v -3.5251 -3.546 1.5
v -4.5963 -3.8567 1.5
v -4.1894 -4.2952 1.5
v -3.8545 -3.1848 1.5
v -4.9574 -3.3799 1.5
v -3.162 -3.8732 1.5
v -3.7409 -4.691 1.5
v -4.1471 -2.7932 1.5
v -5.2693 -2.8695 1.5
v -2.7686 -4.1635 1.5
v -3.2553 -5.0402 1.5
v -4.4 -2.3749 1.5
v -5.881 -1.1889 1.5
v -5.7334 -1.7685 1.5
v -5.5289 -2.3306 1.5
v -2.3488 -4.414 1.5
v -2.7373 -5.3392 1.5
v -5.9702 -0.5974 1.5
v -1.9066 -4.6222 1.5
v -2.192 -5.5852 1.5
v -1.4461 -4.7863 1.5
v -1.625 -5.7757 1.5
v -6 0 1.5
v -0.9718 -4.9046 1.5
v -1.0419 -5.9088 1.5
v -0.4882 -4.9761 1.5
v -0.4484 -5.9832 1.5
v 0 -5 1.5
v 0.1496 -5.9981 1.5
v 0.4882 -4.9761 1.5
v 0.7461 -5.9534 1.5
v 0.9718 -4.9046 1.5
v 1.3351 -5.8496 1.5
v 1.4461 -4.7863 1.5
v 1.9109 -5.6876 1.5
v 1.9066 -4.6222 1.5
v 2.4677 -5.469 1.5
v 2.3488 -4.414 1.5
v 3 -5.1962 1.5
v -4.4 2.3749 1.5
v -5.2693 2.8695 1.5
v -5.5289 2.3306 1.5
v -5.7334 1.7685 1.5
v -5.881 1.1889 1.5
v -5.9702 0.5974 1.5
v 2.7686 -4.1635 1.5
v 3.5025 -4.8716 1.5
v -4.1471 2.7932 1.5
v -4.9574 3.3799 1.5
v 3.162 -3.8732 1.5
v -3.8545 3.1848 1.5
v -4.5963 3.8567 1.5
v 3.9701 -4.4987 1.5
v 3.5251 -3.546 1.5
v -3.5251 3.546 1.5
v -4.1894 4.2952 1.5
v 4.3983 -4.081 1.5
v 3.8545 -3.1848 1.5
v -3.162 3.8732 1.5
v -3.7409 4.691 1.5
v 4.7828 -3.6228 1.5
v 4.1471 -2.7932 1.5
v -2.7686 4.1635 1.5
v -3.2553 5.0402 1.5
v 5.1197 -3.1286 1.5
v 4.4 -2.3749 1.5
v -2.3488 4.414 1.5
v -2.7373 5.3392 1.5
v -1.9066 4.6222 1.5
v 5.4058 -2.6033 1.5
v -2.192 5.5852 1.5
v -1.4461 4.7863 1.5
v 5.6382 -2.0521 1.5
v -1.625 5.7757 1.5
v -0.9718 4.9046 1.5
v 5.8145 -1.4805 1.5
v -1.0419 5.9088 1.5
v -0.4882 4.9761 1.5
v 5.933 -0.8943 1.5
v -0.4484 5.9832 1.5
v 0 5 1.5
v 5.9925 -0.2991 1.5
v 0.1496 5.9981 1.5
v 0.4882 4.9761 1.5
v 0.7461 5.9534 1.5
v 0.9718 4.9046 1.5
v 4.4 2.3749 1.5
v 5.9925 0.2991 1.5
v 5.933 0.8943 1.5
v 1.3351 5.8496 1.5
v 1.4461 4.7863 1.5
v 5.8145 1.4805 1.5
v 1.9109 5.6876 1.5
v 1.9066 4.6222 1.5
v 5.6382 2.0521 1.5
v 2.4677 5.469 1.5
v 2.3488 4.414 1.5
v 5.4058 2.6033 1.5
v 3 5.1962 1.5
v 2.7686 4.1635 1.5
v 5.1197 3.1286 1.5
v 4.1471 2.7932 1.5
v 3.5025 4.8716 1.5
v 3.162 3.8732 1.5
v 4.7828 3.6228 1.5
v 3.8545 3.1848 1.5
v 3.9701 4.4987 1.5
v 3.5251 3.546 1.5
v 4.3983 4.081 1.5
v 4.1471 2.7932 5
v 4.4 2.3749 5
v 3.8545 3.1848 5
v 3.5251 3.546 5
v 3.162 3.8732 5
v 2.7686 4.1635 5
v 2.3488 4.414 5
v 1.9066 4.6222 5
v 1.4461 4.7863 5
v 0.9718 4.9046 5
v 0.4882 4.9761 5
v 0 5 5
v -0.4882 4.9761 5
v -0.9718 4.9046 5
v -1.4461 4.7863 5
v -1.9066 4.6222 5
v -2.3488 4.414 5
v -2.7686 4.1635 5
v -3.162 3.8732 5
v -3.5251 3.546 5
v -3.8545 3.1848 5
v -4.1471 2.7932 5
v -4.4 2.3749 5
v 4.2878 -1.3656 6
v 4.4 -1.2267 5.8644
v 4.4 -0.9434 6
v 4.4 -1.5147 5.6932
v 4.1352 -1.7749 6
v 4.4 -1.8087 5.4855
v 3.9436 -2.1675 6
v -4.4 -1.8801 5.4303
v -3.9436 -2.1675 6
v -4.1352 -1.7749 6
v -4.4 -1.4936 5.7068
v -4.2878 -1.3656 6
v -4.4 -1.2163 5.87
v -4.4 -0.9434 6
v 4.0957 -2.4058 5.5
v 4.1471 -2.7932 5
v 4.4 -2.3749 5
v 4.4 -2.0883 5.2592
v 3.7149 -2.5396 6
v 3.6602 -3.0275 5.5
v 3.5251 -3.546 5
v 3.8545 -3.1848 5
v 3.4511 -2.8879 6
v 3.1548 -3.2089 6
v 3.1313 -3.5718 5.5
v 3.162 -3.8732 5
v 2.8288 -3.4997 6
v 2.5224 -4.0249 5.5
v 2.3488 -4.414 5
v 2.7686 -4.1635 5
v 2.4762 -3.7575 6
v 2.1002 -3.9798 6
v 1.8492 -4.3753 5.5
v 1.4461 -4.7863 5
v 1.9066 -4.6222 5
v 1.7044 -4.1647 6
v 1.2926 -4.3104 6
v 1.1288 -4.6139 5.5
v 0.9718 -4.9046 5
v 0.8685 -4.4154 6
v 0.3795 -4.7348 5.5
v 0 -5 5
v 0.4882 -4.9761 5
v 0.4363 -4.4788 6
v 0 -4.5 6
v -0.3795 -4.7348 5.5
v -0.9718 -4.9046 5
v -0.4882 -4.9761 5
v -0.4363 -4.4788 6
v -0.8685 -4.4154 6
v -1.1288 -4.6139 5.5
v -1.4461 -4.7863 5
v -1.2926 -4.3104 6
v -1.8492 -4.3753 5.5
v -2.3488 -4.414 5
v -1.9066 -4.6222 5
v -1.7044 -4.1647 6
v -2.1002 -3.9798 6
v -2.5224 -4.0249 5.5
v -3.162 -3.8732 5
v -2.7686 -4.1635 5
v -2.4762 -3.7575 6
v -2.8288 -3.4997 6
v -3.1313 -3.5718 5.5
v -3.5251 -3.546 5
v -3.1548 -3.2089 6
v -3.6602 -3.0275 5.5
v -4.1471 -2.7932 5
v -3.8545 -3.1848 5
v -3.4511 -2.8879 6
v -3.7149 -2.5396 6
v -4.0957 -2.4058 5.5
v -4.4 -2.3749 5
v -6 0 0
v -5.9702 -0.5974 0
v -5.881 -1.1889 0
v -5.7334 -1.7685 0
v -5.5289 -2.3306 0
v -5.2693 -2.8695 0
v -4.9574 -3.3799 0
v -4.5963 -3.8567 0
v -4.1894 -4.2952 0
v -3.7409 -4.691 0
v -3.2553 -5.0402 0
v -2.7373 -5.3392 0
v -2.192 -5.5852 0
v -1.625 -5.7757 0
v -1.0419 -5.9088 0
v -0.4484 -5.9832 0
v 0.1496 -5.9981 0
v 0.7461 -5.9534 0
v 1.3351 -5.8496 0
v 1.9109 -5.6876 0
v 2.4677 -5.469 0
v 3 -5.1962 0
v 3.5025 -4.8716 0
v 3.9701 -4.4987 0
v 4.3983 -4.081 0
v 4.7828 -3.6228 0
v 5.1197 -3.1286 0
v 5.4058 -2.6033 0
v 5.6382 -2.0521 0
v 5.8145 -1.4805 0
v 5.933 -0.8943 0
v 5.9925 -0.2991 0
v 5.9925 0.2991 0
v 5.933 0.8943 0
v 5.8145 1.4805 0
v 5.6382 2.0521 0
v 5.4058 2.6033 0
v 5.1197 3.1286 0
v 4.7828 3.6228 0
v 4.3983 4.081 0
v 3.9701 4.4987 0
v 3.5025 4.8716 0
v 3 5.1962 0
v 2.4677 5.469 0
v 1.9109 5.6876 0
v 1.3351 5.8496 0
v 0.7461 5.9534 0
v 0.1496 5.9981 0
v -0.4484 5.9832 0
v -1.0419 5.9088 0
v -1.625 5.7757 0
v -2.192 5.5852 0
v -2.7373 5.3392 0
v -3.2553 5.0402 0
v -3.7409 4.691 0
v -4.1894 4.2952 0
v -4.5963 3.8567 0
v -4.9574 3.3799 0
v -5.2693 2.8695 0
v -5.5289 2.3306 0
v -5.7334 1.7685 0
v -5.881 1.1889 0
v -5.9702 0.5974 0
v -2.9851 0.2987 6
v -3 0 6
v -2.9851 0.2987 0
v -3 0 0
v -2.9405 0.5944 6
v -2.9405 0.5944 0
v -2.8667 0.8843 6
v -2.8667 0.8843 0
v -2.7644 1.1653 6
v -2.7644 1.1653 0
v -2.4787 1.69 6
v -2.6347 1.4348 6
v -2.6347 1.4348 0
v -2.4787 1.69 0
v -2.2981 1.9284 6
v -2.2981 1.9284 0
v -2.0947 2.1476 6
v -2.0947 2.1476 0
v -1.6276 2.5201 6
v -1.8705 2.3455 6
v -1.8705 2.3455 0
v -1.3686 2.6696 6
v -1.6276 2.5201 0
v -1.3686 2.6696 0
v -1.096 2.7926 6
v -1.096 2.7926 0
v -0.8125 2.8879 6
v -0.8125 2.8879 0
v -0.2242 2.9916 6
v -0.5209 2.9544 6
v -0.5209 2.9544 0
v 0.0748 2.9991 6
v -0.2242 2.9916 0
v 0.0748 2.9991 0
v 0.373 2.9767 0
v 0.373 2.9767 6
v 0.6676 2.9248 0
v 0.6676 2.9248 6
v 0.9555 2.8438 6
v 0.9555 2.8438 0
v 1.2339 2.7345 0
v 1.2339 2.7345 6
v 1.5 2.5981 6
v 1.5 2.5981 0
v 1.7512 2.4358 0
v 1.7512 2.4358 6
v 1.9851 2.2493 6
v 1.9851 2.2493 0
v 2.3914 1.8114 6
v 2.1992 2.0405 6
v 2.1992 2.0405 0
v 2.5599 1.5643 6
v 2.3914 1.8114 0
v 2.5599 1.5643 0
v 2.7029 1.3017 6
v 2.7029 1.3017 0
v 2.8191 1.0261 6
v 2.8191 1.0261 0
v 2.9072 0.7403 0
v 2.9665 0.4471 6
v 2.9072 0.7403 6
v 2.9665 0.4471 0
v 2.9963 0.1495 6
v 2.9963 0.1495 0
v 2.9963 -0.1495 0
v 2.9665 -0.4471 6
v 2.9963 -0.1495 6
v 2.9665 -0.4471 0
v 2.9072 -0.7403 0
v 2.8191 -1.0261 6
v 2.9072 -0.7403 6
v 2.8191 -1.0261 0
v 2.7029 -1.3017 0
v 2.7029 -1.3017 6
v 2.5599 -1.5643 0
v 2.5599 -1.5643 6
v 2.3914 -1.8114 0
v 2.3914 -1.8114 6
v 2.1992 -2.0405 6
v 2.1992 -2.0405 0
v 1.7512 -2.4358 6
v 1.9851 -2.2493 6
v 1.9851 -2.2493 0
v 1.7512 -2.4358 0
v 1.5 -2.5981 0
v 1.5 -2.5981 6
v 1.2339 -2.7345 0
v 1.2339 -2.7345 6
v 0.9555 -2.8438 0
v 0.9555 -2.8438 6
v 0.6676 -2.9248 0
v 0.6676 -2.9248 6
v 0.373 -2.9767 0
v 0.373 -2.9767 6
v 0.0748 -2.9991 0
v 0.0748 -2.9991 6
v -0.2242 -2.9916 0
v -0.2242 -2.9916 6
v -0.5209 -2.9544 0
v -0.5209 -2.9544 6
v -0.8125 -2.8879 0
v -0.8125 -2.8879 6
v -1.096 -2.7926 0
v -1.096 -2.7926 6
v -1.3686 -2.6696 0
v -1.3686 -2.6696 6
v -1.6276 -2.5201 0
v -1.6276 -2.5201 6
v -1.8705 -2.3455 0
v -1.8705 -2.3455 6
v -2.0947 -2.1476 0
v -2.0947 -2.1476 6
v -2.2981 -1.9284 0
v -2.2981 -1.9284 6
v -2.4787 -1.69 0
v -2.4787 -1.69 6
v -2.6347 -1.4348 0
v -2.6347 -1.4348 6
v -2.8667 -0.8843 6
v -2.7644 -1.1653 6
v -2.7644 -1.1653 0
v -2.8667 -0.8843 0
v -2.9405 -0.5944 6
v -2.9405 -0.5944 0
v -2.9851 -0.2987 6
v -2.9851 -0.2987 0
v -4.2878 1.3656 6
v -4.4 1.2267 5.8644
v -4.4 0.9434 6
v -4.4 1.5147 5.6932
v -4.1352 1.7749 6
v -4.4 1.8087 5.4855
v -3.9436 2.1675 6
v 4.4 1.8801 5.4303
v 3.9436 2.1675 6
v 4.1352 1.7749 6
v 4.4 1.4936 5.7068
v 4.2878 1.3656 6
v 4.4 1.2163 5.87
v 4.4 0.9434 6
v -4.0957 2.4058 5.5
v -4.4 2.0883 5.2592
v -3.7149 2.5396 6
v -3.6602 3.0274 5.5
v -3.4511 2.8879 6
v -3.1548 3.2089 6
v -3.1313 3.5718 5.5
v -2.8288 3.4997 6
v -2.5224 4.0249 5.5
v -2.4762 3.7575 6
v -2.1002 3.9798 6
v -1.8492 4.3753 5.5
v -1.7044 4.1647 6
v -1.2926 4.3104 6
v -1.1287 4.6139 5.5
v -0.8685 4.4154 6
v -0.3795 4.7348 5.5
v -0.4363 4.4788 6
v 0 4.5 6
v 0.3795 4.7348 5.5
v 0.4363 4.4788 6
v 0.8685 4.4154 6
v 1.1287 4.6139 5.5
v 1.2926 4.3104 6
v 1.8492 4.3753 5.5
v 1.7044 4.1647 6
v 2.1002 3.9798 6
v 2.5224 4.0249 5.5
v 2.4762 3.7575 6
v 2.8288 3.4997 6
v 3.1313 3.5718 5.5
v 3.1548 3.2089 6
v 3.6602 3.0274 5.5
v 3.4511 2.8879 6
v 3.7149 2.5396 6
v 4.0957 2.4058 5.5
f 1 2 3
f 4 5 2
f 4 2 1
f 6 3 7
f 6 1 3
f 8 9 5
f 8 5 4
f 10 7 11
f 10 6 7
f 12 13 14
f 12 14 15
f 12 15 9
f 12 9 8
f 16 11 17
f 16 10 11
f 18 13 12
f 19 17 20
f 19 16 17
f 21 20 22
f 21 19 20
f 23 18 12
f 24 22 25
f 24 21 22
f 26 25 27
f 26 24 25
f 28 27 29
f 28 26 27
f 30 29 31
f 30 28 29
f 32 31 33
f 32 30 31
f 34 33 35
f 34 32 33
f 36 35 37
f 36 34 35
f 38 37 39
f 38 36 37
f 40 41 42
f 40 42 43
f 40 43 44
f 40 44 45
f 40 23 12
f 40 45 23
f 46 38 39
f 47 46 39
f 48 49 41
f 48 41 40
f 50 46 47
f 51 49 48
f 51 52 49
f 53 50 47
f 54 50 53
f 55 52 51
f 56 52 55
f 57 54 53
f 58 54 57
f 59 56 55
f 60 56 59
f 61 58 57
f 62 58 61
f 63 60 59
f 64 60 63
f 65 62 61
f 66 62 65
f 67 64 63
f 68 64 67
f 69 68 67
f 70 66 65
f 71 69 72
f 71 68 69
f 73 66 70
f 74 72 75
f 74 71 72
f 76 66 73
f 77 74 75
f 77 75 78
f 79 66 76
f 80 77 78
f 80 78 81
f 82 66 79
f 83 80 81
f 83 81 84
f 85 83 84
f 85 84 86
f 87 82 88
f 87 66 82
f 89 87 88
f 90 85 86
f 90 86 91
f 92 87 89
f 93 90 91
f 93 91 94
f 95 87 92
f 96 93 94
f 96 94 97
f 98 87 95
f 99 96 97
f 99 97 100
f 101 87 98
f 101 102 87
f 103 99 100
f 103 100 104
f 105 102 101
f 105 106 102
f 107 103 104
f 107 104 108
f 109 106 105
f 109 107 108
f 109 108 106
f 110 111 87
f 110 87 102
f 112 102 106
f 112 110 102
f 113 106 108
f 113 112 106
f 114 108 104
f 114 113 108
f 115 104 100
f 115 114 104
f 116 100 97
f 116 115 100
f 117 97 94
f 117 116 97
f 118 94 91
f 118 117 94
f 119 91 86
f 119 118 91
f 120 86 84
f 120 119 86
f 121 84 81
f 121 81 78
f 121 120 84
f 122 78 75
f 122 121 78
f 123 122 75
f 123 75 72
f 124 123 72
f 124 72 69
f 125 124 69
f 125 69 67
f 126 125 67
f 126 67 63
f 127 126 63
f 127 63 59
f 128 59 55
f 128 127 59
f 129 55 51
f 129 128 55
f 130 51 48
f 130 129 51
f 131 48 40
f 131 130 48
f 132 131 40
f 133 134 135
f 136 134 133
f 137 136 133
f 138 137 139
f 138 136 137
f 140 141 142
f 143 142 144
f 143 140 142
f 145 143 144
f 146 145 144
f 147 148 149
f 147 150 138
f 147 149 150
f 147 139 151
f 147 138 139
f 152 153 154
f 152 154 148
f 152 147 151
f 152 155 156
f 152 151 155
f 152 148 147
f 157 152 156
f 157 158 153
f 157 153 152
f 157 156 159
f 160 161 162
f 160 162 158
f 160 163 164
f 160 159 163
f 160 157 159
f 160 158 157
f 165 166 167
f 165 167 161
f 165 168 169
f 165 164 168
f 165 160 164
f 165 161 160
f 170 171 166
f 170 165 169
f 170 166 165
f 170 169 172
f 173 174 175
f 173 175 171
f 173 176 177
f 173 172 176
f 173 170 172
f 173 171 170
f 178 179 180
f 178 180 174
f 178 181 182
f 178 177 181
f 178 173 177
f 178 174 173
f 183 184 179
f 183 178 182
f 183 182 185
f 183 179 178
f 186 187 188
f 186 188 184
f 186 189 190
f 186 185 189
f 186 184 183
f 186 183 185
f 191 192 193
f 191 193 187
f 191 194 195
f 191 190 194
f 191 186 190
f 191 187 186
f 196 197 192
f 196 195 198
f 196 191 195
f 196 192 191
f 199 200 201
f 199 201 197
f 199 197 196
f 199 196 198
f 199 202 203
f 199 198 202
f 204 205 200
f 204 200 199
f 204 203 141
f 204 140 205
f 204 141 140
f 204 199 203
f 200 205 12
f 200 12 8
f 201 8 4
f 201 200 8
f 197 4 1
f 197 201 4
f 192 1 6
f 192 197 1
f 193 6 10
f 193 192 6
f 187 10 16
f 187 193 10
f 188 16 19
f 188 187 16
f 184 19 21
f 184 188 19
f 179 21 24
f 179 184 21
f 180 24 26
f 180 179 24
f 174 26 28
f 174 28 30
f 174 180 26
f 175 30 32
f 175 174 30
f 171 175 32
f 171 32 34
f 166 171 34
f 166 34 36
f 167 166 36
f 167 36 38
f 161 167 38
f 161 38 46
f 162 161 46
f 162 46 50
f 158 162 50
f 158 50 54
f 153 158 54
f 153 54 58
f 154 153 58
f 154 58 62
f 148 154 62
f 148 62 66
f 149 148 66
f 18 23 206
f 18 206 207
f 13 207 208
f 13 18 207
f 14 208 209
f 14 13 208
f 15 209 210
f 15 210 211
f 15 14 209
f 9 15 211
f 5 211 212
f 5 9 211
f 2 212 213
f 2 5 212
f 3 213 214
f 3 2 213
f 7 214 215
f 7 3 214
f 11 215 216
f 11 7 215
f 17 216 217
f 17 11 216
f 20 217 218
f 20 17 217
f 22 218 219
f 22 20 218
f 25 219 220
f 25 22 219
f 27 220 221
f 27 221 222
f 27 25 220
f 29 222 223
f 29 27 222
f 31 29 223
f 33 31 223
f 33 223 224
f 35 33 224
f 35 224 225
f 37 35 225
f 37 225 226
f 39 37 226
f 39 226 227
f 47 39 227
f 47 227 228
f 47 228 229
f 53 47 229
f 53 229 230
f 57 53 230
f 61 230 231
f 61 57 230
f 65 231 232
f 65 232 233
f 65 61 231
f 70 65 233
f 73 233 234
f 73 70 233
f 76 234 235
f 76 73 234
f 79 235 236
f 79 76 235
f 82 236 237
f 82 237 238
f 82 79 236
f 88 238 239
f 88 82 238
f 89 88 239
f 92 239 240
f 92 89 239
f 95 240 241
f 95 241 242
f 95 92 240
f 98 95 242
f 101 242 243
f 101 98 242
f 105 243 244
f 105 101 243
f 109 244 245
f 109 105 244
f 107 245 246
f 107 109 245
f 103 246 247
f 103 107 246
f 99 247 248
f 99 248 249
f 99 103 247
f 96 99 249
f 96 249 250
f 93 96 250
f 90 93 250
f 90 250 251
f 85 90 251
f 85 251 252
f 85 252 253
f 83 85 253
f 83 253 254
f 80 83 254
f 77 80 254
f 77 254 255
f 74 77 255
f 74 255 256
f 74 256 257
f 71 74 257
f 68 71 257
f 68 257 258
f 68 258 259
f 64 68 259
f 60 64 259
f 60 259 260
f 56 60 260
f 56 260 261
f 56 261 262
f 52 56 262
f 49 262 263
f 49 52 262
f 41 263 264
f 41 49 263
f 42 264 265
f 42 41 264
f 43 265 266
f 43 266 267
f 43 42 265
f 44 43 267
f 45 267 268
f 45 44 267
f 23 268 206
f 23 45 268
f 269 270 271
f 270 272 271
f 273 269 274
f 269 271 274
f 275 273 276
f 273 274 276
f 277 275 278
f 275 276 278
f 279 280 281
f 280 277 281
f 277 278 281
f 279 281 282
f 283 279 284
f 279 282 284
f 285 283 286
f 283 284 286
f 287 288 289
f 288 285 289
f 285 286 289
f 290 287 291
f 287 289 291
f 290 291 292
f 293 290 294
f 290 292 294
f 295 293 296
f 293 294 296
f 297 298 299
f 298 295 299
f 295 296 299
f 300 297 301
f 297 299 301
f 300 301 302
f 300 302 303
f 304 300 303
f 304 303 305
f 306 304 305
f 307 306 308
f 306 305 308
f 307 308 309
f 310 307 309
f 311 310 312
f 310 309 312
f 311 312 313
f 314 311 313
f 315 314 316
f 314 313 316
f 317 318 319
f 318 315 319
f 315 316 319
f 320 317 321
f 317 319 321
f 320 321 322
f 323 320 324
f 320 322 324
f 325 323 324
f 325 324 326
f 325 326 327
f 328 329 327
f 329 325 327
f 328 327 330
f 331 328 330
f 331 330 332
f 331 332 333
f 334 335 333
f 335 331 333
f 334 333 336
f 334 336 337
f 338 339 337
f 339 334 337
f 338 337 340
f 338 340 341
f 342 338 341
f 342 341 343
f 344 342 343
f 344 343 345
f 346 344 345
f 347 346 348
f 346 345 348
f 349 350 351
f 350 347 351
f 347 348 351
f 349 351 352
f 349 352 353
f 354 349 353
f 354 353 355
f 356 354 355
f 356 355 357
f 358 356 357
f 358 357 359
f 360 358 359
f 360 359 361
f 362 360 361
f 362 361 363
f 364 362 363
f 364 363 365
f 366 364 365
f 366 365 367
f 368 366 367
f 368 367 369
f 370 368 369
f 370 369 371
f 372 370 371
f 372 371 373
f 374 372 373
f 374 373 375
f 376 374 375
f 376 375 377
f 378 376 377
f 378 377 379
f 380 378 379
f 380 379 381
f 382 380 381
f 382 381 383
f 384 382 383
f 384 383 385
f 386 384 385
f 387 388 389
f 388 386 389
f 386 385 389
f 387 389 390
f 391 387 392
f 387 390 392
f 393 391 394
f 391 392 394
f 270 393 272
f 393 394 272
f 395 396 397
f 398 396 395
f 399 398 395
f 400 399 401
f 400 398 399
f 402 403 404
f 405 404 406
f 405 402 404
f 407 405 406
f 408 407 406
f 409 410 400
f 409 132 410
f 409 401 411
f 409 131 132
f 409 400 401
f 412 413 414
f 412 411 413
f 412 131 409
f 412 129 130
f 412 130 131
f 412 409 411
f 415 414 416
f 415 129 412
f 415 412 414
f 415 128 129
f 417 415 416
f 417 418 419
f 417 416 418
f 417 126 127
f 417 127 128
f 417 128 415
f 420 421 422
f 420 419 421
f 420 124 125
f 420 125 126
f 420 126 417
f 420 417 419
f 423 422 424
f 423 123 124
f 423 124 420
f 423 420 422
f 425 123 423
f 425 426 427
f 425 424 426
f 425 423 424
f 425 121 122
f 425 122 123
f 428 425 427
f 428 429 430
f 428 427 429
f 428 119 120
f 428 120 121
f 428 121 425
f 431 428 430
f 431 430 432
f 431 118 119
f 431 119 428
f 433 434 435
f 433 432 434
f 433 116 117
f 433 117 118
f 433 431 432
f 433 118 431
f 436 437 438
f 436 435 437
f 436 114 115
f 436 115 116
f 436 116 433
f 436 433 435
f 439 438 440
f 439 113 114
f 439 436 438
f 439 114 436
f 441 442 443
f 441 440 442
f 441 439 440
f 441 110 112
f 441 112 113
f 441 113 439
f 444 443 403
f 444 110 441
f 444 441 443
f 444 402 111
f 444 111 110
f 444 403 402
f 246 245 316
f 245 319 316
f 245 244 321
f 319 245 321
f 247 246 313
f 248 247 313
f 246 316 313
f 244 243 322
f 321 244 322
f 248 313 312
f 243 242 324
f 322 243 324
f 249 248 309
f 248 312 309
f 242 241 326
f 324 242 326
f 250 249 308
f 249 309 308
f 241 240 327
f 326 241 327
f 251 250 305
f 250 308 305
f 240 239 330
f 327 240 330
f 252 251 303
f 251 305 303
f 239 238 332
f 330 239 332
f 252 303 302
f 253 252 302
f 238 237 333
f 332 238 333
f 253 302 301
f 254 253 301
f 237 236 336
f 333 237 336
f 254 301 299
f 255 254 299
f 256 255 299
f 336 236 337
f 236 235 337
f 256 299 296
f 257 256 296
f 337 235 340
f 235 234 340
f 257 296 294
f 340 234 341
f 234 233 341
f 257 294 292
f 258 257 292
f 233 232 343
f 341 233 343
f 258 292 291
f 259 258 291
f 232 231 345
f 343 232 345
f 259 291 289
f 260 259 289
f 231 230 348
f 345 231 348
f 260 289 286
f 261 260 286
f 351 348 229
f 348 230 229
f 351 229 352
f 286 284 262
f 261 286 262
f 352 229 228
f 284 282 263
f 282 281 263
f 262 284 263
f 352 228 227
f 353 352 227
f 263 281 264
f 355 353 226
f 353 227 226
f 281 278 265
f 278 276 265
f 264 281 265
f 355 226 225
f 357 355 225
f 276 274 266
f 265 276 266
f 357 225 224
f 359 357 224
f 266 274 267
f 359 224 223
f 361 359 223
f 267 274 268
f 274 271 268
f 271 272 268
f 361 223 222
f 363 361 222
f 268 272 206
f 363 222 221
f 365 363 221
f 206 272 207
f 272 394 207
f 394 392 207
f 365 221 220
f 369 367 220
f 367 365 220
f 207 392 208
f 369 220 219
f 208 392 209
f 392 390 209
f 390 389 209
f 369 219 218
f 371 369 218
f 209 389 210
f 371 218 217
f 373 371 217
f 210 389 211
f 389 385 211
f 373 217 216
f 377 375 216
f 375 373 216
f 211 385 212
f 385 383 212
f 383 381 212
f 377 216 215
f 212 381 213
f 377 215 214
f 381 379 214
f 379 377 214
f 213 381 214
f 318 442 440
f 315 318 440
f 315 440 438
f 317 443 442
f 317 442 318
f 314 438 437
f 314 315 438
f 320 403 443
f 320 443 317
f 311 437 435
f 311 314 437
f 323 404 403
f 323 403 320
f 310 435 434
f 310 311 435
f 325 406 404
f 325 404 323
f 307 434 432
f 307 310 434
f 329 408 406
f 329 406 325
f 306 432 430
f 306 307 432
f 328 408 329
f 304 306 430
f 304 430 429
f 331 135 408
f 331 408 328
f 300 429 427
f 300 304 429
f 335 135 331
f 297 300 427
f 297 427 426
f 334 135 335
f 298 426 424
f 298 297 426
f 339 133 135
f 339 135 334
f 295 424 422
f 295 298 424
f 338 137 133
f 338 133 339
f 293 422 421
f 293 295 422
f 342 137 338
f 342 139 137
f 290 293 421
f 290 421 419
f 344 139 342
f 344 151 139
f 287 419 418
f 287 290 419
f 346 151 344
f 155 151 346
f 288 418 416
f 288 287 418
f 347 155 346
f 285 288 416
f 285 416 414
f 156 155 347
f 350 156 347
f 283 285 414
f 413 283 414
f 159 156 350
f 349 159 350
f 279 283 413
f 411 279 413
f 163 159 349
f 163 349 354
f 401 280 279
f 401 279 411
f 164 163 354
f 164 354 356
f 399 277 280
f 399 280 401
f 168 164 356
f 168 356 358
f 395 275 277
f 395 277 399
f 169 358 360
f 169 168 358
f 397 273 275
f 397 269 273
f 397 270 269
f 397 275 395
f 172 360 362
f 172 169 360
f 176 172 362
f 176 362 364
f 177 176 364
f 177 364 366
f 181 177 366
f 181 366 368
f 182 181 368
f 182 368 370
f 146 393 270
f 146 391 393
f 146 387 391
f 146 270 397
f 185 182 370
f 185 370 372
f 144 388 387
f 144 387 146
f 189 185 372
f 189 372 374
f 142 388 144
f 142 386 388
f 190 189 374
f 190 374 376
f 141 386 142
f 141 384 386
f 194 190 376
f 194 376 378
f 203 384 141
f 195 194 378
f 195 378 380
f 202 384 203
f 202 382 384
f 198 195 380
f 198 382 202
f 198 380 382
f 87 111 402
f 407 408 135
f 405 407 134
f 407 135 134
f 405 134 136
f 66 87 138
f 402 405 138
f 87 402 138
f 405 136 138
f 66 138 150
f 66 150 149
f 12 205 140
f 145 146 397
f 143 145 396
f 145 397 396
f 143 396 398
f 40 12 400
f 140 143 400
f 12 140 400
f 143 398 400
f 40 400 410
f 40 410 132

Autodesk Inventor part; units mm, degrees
ref_plane "YZ Plane" through (0, 0, 0) normal (1, 0, 0) x (0, 1, 0)
ref_plane "XZ Plane" through (0, 0, 0) normal (0, 1, 0) x (-1, 0, 0)
ref_plane "XY Plane" through (0, 0, 0) normal (0, 0, 1) x (1, 0, 0)
sketch "スケッチ1" plane through (0, 0, 0) normal (0, 1, 0) x (-1, 0, 0)
  line L0 (3, 0) -> (6, 0)
  line L1 (6, 0) -> (6, 1.5)
  line L2 (6, 1.5) -> (5, 1.5)
  line L3 (5, 1.5) -> (5, 5)
  line L4 (4.5, 6) -> (3, 6)
  line L5 (3, 6) -> (3, 0)
  line L6 (5, 5) -> (4.5, 6)
  line L7 (0, -1.2) -> (0, 7.2) projected
  point P0 (0, 0)
  point P1 (3, 6)
  dimension "d5" = 1.5
  dimension "d9" = 1
  dimension "d10" = 0.5
  dimension "d17" = 10
  dimension "d18" = 12
  dimension "d19" = 6
  dimension "d20" = 6
revolve "回転1" add sketch "スケッチ1" angle 360 about axis through (0, 0, -10) along (0, 0, 1)
sketch "スケッチ2" plane through (0, 0, 6) normal (0, 0, 1) x (1, 0, 0)
  line L0 (4.4, -2.3749) -> (-4.4, -2.3749)
  line L1 (-4.4, -2.3749) -> (-4.4, 2.3749)
  line L2 (-4.4, 2.3749) -> (4.4, 2.3749)
  line L3 (4.4, 2.3749) -> (4.4, -2.3749)
  line L4 (4.4, -2.3749) -> (-4.4, 2.3749) construction
  line L5 (-4.4, -2.3749) -> (4.4, 2.3749) construction
  circle A0 centre (0, 0) radius 5
  point P0 (0, 0)
  dimension "d12" = 10
  dimension "d11" = 8.8
extrude "押し出し1" cut sketch "スケッチ2" against normal up to surface (4.5 mm away) contours L3 A0 | A0 L1
properties part number "LED-0606" material "アセタール樹脂、黒"
